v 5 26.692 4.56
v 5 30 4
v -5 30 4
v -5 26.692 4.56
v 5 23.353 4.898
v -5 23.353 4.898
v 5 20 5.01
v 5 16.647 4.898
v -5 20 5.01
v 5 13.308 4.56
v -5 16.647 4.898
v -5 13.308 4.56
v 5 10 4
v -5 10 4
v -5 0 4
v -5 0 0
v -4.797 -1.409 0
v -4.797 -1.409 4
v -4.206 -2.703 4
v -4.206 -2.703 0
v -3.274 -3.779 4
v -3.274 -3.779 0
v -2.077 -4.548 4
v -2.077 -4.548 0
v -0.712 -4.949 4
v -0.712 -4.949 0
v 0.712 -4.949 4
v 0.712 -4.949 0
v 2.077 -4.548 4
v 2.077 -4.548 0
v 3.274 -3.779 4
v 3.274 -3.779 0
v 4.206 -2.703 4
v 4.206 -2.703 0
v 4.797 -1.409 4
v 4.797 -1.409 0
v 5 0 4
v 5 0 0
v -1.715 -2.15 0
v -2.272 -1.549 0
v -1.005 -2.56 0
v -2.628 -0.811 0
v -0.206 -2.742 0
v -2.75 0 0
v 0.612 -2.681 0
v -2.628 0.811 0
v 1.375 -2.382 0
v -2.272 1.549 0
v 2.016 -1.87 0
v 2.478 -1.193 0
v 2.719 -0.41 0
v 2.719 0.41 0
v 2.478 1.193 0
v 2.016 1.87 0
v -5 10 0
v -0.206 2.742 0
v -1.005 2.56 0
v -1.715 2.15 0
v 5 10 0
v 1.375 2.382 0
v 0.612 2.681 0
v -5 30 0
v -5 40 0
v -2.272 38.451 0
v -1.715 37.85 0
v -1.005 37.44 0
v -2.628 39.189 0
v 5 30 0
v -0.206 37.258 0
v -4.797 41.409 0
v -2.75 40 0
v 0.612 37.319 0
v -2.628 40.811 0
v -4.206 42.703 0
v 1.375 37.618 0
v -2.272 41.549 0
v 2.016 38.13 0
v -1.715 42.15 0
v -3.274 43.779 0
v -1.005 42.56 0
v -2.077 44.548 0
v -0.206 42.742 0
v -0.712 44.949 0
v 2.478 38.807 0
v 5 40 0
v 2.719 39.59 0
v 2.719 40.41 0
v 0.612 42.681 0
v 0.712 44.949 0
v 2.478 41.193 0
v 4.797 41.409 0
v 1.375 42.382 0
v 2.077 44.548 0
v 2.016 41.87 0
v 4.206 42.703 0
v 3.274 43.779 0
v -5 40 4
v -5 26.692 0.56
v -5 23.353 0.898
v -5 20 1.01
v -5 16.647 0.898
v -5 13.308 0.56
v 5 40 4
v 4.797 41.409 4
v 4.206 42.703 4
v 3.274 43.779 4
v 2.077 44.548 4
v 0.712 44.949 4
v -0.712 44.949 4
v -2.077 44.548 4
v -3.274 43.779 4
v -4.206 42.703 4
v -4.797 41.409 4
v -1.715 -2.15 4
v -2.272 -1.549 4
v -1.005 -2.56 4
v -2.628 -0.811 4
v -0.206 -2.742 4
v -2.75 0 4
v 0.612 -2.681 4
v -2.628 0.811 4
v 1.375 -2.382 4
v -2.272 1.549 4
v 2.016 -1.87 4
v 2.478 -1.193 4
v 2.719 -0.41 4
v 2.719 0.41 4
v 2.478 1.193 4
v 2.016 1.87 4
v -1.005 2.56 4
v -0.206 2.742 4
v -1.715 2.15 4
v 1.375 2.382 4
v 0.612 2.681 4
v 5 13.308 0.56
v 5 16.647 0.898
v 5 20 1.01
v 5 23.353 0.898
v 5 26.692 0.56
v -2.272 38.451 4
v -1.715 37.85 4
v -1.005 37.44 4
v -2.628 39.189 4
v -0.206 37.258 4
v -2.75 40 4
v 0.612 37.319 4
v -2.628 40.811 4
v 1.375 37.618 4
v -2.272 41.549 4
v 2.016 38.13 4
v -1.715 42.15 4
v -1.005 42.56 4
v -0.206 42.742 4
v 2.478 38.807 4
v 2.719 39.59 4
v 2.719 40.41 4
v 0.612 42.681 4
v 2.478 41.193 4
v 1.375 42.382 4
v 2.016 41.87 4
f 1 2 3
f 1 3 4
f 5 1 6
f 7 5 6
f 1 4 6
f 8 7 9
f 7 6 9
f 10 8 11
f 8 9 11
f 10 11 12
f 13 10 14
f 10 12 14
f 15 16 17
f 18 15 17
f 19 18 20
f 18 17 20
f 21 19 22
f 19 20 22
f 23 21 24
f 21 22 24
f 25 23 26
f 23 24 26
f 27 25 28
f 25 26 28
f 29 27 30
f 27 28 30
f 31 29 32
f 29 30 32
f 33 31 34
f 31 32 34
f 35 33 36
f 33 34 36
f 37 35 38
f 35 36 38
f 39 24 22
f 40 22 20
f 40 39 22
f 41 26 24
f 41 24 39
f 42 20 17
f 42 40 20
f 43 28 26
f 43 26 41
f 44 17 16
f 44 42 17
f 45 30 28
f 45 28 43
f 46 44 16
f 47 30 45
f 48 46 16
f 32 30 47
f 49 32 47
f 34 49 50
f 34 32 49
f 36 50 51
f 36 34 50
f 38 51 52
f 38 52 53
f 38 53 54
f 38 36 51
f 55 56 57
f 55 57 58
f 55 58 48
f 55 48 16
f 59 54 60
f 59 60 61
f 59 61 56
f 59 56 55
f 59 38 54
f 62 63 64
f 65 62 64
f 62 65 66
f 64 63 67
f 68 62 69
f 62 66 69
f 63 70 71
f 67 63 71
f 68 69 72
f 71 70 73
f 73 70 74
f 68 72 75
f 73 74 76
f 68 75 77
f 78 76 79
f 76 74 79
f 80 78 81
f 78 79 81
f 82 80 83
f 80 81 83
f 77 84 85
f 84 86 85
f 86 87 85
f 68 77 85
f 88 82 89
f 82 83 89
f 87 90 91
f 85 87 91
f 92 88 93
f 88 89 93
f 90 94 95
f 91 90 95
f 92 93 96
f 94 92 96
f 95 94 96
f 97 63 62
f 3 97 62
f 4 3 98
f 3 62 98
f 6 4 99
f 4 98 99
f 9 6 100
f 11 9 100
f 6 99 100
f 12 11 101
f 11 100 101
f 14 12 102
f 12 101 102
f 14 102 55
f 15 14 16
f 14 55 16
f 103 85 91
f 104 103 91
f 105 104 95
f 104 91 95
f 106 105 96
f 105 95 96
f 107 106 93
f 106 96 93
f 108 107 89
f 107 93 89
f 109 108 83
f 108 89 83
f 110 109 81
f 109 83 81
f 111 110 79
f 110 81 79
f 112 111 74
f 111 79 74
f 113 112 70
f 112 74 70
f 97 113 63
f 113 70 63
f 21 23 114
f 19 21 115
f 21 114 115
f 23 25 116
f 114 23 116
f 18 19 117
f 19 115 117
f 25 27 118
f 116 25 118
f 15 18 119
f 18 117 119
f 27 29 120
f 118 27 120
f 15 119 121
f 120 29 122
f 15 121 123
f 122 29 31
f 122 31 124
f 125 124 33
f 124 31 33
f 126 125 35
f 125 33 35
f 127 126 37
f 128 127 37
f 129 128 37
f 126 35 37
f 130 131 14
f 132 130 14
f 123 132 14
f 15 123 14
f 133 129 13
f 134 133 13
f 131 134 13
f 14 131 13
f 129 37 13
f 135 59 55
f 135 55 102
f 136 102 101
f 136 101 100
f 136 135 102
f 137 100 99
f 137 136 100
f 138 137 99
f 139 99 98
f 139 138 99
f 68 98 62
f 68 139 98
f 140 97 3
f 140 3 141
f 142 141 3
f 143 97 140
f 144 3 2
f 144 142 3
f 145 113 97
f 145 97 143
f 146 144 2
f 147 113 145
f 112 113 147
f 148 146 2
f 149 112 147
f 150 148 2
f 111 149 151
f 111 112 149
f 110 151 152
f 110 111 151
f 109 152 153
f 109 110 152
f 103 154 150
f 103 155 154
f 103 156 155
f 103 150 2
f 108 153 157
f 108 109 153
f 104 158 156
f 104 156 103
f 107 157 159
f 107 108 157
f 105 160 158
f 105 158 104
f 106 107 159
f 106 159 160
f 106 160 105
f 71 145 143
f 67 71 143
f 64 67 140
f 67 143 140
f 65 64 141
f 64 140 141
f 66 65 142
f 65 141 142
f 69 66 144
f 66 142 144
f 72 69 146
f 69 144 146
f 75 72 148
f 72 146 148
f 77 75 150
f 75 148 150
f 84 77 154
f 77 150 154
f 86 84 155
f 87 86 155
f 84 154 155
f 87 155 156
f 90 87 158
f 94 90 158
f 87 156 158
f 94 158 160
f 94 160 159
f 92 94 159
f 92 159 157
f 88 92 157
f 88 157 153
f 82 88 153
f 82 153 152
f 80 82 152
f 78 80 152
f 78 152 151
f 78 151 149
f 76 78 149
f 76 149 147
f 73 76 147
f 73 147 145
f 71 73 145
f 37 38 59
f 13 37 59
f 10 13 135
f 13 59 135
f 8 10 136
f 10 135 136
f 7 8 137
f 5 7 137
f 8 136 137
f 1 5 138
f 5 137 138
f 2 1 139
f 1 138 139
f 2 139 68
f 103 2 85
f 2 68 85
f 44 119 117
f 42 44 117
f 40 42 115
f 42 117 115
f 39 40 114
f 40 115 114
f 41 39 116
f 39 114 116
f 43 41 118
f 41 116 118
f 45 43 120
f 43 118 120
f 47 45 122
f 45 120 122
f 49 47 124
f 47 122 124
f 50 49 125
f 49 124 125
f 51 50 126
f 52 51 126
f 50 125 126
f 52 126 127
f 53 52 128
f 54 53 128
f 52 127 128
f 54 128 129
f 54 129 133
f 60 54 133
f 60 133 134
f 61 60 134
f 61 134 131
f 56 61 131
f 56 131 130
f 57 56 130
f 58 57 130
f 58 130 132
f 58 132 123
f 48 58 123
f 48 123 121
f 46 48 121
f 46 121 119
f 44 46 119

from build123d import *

# Parameters (mm, degrees)
F1_DEPTH = 4
F2_D     = 5.5
F2_DEPTH = 7
F2_TIP   = 1.6523667023
F3_W     = 5
F3_H     = 4
F4_DEPTH = 5
F6_DEPTH = 4
F7_D     = 5.5
F7_DEPTH = 7
F7_TIP   = 1.6523667023


with BuildPart() as f1:
    # F0 (on Top) → F1 (new body)
    with BuildSketch(Plane.XY):
        with BuildLine():
            Line((-5, 5), (-5, 0))
            ThreePointArc((-5, 0), (0, -5), (5, 0))
            Line((5, 0), (5, 5))
            Line((5, 5), (-5, 5))
        make_face()
    extrude(amount=F1_DEPTH)

    # F2
    with Locations(Plane(origin=(0, 0, 0), x_dir=(1, 0, 0), z_dir=(0, 0, -1))):
        with Locations((0, 0)):
            Hole(F2_D / 2, depth=F2_DEPTH)
            with Locations((0, 0, -(F2_DEPTH + F2_TIP / 2))):  # 118° drill point
                Cone(0, F2_D / 2, F2_TIP, mode=Mode.SUBTRACT)

    # F3 (on Right) → F4 (join, symmetric)
    with BuildSketch(Plane.YZ):
        with Locations((7.5, 2)):
            Rectangle(F3_W, F3_H)
        with BuildLine():
            Line((10, 4), (10, 0))
            ThreePointArc((10, 0), (14.9745518997, 0.7570127946), (20, 1.0102051443))
            Line((20, 1.0102051443), (20, 5.0102051443))
            ThreePointArc((20, 5.0102051443), (14.9745518997, 4.7570127946), (10, 4))
        make_face()
        with BuildLine():
            Line((20, 5.0102051443), (20, 1.0102051443))
            ThreePointArc((20, 1.0102051443), (25.0254481003, 0.7570127946), (30, 0))
            Line((30, 0), (30, 4))
            ThreePointArc((30, 4), (25.0254481003, 4.7570127946), (20, 5.0102051443))
        make_face()
        with Locations((32.5, 2)):
            Rectangle(F3_W, F3_H)
    extrude(amount=F4_DEPTH, both=True)

    # F5 (on Top) → F6 (join)
    with BuildSketch(Plane.XY):
        with BuildLine():
            Line((5, 35), (5, 40))
            ThreePointArc((5, 40), (0, 45), (-5, 40))
            Line((-5, 40), (-5, 35))
            Line((-5, 35), (5, 35))
        make_face()
    extrude(amount=F6_DEPTH)

    # F7
    with Locations(Plane(origin=(0, 0, 0), x_dir=(1, 0, 0), z_dir=(0, 0, -1))):
        with Locations((0, -40)):
            Hole(F7_D / 2, depth=F7_DEPTH)
            with Locations((0, 0, -(F7_DEPTH + F7_TIP / 2))):  # 118° drill point
                Cone(0, F7_D / 2, F7_TIP, mode=Mode.SUBTRACT)


solid = f1.part
